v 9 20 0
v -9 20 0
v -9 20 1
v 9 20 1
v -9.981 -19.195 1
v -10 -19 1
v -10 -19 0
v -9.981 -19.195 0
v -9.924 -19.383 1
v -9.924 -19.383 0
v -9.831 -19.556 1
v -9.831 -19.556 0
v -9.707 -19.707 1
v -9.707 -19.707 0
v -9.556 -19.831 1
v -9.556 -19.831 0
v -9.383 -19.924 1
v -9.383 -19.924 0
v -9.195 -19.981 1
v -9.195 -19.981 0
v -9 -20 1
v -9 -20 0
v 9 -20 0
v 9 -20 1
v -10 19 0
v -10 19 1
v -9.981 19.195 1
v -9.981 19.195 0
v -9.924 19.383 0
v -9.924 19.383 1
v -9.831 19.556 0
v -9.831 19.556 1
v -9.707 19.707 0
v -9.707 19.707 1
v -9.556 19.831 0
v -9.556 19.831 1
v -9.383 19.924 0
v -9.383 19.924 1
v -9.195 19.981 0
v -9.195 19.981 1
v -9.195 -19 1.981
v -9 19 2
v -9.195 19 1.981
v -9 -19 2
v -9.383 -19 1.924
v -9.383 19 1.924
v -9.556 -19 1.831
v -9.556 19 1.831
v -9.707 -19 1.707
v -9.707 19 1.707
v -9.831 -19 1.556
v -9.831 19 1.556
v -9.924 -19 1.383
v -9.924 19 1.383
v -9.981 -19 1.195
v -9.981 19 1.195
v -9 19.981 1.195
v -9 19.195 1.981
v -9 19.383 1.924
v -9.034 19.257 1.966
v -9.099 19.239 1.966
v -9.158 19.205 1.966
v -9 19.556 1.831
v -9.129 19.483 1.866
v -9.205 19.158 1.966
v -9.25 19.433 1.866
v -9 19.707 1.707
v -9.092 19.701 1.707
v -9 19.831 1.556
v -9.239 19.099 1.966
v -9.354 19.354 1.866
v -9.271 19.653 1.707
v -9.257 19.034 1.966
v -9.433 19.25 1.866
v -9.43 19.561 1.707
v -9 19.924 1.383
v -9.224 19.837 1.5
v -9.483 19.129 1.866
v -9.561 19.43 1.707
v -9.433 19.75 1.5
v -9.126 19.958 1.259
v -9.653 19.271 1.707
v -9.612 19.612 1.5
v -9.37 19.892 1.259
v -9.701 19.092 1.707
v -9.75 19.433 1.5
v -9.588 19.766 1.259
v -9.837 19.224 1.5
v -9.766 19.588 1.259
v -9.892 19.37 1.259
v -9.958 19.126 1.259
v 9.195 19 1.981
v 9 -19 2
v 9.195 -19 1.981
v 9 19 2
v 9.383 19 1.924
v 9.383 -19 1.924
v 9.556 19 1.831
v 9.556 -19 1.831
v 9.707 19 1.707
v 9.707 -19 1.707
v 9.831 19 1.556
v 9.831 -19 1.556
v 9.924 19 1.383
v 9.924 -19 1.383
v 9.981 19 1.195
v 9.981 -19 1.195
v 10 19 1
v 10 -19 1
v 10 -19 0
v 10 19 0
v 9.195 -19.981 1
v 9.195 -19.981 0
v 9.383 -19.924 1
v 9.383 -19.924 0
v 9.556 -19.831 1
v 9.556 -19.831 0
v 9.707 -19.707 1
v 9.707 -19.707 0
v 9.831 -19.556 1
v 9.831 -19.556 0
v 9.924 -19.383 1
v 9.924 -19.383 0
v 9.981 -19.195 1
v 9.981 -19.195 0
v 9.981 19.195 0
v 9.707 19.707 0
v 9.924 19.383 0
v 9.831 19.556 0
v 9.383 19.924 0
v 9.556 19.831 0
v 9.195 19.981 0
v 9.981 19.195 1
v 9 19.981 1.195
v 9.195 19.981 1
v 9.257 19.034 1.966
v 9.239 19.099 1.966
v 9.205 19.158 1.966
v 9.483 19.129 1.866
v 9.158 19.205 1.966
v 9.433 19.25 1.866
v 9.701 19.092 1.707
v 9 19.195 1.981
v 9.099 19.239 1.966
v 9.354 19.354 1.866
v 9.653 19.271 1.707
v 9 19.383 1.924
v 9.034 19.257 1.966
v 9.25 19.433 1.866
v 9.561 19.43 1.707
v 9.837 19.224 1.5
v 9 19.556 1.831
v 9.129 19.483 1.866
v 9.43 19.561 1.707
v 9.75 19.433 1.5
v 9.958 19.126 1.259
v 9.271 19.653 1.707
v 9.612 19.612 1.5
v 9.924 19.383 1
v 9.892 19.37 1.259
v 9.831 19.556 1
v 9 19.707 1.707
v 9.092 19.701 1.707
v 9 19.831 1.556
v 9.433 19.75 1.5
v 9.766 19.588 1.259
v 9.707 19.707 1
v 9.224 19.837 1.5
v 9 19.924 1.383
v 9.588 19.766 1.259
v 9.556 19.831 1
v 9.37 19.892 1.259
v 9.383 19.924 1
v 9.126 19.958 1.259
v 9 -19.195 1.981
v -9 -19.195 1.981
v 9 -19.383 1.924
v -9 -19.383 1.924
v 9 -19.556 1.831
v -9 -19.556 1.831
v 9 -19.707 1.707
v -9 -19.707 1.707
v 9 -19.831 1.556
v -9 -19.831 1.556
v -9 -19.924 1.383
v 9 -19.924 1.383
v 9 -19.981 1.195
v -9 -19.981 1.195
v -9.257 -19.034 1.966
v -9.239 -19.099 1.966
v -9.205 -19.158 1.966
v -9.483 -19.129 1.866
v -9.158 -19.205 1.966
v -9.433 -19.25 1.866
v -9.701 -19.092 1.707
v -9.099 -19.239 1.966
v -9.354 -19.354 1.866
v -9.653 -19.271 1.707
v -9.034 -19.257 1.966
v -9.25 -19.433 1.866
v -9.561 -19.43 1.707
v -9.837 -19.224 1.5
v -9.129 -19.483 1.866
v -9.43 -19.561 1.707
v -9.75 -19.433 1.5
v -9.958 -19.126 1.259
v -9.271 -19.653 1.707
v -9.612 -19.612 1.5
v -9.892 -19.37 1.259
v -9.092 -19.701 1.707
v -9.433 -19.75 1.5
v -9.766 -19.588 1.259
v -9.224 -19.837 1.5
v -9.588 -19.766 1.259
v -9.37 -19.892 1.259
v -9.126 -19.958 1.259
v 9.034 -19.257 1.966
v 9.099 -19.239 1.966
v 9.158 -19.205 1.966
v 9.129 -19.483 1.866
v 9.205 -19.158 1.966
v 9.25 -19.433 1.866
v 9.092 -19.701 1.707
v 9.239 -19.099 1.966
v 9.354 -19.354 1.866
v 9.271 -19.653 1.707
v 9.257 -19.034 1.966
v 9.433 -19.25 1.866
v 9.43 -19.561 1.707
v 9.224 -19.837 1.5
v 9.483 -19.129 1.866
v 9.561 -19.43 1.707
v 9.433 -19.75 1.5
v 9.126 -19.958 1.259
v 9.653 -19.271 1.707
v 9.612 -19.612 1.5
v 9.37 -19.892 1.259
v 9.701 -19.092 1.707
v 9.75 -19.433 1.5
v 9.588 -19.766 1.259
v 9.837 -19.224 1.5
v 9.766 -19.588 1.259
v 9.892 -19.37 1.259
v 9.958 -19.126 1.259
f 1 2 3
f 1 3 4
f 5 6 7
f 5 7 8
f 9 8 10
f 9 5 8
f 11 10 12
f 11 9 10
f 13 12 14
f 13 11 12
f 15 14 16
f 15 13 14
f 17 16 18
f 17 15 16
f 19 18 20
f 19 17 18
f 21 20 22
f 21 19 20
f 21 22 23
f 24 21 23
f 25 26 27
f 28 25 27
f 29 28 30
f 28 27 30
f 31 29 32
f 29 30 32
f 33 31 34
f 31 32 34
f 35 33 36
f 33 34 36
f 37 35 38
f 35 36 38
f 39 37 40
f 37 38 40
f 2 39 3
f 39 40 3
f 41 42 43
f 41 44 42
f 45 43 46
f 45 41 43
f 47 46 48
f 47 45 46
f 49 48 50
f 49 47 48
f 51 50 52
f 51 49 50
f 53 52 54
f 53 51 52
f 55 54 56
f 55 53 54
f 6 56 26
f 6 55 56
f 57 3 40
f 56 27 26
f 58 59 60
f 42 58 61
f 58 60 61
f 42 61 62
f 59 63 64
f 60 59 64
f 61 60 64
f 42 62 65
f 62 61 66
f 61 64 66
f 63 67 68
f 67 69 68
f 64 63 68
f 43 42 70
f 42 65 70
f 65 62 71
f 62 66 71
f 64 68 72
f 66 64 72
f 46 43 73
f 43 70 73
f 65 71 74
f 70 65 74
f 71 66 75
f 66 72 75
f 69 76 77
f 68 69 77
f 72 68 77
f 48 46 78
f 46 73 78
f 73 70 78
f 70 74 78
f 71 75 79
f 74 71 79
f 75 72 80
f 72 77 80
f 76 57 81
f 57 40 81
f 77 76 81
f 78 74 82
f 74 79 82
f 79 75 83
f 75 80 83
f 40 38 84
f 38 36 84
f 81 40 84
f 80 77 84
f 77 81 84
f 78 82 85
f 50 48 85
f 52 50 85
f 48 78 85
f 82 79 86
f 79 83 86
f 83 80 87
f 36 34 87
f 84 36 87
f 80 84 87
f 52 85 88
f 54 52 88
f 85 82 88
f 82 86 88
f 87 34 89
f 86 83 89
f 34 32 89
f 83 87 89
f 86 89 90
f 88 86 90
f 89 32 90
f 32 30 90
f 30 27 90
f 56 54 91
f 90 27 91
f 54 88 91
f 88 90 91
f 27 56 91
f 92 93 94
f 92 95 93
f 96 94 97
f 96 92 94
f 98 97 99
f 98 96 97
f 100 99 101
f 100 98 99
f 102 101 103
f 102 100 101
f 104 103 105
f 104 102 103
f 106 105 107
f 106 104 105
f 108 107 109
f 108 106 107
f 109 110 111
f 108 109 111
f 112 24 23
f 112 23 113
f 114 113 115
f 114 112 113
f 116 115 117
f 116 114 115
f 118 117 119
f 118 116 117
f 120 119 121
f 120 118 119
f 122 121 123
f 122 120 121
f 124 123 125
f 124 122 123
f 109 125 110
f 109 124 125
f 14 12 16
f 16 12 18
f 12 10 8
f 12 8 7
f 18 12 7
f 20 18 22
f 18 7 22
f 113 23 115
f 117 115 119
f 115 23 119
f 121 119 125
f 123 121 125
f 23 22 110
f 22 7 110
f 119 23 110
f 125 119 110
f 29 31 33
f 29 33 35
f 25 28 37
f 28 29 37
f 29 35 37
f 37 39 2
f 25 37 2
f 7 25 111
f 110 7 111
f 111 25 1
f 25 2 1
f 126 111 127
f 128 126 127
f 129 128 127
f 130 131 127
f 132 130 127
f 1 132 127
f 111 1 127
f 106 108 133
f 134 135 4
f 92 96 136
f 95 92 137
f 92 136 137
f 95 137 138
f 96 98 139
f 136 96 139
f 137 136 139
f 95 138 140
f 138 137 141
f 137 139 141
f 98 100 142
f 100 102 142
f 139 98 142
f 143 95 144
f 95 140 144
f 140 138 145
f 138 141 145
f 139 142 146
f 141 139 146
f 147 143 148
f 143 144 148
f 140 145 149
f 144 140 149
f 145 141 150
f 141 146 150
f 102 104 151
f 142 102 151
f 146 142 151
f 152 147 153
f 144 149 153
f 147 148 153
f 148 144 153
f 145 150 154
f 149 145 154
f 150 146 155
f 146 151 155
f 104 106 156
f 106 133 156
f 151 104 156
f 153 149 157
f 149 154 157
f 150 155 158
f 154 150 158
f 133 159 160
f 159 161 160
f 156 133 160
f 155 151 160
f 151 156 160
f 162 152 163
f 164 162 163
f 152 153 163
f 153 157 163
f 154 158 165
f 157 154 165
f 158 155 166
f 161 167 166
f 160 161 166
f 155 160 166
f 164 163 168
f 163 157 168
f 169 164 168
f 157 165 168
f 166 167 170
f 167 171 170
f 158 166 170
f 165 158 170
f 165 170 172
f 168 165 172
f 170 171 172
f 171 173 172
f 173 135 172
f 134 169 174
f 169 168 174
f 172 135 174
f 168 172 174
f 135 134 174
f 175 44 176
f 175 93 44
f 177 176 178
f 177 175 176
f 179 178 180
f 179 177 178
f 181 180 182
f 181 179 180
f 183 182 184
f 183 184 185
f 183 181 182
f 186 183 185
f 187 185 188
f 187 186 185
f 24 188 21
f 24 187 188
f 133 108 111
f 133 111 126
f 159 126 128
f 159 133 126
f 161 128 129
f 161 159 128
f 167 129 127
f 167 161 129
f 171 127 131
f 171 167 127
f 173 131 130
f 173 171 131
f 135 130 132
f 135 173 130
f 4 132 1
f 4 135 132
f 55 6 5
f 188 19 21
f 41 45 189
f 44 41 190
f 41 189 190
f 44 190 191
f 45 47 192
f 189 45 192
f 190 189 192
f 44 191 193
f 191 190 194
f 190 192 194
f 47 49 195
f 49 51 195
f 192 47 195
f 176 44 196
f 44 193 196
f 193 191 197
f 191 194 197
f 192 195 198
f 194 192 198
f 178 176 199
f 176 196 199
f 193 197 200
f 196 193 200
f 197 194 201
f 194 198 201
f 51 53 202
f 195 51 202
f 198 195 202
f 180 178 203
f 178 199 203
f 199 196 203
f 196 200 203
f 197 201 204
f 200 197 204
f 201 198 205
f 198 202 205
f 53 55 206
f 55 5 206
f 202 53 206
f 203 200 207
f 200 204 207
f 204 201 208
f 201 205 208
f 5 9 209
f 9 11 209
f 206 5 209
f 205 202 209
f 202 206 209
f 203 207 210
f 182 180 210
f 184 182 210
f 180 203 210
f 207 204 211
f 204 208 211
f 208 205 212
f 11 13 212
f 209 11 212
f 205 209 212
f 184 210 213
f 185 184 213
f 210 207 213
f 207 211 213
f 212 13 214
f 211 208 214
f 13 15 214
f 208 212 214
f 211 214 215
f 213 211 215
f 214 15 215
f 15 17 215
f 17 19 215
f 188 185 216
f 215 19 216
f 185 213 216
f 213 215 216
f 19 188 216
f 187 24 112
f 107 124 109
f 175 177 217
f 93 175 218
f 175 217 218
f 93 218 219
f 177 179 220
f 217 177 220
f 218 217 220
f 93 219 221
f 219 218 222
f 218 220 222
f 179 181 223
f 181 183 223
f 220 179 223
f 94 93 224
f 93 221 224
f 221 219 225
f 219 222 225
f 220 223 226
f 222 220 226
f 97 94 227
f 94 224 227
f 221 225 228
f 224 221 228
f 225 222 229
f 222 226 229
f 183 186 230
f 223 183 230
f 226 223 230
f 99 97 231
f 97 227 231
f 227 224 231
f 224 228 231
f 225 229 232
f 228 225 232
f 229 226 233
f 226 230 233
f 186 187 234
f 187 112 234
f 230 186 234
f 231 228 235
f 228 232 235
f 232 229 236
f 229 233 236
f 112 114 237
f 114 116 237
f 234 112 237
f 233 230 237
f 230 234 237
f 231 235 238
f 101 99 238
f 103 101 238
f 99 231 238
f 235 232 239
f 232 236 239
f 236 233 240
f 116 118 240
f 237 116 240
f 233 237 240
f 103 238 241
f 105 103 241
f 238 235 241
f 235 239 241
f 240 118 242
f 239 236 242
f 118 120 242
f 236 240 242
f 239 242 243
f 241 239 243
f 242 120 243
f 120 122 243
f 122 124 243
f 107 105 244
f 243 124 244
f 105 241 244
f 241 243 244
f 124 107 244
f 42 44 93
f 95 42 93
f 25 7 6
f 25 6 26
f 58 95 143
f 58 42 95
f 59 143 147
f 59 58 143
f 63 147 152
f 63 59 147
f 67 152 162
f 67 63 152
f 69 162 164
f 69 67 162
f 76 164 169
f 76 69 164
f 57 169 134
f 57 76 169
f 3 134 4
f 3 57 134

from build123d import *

# Parameters (mm, degrees)
CAP_SKETCH_W            = 20
CAP_SKETCH_H            = 40
EXTRUDE_THICKNESS_DEPTH = 2
CORNER_FILLETS_R        = 1
TOP_EDGE_FILLET_R       = 1


with BuildPart() as part:
    # Cap Sketch → Extrude Thickness (new body)
    with BuildSketch(Plane.XY):
        Rectangle(CAP_SKETCH_W, CAP_SKETCH_H)
    extrude(amount=EXTRUDE_THICKNESS_DEPTH)

    # Corner Fillets
    corner_fillets_edges = [part.edges().sort_by_distance(p)[0] for p in [
        (10, -20, 1),
        (-10, -20, 1),
        (-10, 20, 1),
        (10, 20, 1),
    ]]
    fillet(corner_fillets_edges, radius=CORNER_FILLETS_R)

    # Top Edge Fillet
    top_edge_fillet_edges = [part.edges().sort_by_distance(p)[0] for p in [
        (0, -20, 2),
        (-10, 0, 2),
        (10, 0, 2),
        (0, 20, 2),
        (9.707106781, -19.707106781, 2),
        (9.707106781, 19.707106781, 2),
        (-9.707106781, 19.707106781, 2),
        (-9.707106781, -19.707106781, 2),
    ]]
    fillet(top_edge_fillet_edges, radius=TOP_EDGE_FILLET_R)


solid = part.part
